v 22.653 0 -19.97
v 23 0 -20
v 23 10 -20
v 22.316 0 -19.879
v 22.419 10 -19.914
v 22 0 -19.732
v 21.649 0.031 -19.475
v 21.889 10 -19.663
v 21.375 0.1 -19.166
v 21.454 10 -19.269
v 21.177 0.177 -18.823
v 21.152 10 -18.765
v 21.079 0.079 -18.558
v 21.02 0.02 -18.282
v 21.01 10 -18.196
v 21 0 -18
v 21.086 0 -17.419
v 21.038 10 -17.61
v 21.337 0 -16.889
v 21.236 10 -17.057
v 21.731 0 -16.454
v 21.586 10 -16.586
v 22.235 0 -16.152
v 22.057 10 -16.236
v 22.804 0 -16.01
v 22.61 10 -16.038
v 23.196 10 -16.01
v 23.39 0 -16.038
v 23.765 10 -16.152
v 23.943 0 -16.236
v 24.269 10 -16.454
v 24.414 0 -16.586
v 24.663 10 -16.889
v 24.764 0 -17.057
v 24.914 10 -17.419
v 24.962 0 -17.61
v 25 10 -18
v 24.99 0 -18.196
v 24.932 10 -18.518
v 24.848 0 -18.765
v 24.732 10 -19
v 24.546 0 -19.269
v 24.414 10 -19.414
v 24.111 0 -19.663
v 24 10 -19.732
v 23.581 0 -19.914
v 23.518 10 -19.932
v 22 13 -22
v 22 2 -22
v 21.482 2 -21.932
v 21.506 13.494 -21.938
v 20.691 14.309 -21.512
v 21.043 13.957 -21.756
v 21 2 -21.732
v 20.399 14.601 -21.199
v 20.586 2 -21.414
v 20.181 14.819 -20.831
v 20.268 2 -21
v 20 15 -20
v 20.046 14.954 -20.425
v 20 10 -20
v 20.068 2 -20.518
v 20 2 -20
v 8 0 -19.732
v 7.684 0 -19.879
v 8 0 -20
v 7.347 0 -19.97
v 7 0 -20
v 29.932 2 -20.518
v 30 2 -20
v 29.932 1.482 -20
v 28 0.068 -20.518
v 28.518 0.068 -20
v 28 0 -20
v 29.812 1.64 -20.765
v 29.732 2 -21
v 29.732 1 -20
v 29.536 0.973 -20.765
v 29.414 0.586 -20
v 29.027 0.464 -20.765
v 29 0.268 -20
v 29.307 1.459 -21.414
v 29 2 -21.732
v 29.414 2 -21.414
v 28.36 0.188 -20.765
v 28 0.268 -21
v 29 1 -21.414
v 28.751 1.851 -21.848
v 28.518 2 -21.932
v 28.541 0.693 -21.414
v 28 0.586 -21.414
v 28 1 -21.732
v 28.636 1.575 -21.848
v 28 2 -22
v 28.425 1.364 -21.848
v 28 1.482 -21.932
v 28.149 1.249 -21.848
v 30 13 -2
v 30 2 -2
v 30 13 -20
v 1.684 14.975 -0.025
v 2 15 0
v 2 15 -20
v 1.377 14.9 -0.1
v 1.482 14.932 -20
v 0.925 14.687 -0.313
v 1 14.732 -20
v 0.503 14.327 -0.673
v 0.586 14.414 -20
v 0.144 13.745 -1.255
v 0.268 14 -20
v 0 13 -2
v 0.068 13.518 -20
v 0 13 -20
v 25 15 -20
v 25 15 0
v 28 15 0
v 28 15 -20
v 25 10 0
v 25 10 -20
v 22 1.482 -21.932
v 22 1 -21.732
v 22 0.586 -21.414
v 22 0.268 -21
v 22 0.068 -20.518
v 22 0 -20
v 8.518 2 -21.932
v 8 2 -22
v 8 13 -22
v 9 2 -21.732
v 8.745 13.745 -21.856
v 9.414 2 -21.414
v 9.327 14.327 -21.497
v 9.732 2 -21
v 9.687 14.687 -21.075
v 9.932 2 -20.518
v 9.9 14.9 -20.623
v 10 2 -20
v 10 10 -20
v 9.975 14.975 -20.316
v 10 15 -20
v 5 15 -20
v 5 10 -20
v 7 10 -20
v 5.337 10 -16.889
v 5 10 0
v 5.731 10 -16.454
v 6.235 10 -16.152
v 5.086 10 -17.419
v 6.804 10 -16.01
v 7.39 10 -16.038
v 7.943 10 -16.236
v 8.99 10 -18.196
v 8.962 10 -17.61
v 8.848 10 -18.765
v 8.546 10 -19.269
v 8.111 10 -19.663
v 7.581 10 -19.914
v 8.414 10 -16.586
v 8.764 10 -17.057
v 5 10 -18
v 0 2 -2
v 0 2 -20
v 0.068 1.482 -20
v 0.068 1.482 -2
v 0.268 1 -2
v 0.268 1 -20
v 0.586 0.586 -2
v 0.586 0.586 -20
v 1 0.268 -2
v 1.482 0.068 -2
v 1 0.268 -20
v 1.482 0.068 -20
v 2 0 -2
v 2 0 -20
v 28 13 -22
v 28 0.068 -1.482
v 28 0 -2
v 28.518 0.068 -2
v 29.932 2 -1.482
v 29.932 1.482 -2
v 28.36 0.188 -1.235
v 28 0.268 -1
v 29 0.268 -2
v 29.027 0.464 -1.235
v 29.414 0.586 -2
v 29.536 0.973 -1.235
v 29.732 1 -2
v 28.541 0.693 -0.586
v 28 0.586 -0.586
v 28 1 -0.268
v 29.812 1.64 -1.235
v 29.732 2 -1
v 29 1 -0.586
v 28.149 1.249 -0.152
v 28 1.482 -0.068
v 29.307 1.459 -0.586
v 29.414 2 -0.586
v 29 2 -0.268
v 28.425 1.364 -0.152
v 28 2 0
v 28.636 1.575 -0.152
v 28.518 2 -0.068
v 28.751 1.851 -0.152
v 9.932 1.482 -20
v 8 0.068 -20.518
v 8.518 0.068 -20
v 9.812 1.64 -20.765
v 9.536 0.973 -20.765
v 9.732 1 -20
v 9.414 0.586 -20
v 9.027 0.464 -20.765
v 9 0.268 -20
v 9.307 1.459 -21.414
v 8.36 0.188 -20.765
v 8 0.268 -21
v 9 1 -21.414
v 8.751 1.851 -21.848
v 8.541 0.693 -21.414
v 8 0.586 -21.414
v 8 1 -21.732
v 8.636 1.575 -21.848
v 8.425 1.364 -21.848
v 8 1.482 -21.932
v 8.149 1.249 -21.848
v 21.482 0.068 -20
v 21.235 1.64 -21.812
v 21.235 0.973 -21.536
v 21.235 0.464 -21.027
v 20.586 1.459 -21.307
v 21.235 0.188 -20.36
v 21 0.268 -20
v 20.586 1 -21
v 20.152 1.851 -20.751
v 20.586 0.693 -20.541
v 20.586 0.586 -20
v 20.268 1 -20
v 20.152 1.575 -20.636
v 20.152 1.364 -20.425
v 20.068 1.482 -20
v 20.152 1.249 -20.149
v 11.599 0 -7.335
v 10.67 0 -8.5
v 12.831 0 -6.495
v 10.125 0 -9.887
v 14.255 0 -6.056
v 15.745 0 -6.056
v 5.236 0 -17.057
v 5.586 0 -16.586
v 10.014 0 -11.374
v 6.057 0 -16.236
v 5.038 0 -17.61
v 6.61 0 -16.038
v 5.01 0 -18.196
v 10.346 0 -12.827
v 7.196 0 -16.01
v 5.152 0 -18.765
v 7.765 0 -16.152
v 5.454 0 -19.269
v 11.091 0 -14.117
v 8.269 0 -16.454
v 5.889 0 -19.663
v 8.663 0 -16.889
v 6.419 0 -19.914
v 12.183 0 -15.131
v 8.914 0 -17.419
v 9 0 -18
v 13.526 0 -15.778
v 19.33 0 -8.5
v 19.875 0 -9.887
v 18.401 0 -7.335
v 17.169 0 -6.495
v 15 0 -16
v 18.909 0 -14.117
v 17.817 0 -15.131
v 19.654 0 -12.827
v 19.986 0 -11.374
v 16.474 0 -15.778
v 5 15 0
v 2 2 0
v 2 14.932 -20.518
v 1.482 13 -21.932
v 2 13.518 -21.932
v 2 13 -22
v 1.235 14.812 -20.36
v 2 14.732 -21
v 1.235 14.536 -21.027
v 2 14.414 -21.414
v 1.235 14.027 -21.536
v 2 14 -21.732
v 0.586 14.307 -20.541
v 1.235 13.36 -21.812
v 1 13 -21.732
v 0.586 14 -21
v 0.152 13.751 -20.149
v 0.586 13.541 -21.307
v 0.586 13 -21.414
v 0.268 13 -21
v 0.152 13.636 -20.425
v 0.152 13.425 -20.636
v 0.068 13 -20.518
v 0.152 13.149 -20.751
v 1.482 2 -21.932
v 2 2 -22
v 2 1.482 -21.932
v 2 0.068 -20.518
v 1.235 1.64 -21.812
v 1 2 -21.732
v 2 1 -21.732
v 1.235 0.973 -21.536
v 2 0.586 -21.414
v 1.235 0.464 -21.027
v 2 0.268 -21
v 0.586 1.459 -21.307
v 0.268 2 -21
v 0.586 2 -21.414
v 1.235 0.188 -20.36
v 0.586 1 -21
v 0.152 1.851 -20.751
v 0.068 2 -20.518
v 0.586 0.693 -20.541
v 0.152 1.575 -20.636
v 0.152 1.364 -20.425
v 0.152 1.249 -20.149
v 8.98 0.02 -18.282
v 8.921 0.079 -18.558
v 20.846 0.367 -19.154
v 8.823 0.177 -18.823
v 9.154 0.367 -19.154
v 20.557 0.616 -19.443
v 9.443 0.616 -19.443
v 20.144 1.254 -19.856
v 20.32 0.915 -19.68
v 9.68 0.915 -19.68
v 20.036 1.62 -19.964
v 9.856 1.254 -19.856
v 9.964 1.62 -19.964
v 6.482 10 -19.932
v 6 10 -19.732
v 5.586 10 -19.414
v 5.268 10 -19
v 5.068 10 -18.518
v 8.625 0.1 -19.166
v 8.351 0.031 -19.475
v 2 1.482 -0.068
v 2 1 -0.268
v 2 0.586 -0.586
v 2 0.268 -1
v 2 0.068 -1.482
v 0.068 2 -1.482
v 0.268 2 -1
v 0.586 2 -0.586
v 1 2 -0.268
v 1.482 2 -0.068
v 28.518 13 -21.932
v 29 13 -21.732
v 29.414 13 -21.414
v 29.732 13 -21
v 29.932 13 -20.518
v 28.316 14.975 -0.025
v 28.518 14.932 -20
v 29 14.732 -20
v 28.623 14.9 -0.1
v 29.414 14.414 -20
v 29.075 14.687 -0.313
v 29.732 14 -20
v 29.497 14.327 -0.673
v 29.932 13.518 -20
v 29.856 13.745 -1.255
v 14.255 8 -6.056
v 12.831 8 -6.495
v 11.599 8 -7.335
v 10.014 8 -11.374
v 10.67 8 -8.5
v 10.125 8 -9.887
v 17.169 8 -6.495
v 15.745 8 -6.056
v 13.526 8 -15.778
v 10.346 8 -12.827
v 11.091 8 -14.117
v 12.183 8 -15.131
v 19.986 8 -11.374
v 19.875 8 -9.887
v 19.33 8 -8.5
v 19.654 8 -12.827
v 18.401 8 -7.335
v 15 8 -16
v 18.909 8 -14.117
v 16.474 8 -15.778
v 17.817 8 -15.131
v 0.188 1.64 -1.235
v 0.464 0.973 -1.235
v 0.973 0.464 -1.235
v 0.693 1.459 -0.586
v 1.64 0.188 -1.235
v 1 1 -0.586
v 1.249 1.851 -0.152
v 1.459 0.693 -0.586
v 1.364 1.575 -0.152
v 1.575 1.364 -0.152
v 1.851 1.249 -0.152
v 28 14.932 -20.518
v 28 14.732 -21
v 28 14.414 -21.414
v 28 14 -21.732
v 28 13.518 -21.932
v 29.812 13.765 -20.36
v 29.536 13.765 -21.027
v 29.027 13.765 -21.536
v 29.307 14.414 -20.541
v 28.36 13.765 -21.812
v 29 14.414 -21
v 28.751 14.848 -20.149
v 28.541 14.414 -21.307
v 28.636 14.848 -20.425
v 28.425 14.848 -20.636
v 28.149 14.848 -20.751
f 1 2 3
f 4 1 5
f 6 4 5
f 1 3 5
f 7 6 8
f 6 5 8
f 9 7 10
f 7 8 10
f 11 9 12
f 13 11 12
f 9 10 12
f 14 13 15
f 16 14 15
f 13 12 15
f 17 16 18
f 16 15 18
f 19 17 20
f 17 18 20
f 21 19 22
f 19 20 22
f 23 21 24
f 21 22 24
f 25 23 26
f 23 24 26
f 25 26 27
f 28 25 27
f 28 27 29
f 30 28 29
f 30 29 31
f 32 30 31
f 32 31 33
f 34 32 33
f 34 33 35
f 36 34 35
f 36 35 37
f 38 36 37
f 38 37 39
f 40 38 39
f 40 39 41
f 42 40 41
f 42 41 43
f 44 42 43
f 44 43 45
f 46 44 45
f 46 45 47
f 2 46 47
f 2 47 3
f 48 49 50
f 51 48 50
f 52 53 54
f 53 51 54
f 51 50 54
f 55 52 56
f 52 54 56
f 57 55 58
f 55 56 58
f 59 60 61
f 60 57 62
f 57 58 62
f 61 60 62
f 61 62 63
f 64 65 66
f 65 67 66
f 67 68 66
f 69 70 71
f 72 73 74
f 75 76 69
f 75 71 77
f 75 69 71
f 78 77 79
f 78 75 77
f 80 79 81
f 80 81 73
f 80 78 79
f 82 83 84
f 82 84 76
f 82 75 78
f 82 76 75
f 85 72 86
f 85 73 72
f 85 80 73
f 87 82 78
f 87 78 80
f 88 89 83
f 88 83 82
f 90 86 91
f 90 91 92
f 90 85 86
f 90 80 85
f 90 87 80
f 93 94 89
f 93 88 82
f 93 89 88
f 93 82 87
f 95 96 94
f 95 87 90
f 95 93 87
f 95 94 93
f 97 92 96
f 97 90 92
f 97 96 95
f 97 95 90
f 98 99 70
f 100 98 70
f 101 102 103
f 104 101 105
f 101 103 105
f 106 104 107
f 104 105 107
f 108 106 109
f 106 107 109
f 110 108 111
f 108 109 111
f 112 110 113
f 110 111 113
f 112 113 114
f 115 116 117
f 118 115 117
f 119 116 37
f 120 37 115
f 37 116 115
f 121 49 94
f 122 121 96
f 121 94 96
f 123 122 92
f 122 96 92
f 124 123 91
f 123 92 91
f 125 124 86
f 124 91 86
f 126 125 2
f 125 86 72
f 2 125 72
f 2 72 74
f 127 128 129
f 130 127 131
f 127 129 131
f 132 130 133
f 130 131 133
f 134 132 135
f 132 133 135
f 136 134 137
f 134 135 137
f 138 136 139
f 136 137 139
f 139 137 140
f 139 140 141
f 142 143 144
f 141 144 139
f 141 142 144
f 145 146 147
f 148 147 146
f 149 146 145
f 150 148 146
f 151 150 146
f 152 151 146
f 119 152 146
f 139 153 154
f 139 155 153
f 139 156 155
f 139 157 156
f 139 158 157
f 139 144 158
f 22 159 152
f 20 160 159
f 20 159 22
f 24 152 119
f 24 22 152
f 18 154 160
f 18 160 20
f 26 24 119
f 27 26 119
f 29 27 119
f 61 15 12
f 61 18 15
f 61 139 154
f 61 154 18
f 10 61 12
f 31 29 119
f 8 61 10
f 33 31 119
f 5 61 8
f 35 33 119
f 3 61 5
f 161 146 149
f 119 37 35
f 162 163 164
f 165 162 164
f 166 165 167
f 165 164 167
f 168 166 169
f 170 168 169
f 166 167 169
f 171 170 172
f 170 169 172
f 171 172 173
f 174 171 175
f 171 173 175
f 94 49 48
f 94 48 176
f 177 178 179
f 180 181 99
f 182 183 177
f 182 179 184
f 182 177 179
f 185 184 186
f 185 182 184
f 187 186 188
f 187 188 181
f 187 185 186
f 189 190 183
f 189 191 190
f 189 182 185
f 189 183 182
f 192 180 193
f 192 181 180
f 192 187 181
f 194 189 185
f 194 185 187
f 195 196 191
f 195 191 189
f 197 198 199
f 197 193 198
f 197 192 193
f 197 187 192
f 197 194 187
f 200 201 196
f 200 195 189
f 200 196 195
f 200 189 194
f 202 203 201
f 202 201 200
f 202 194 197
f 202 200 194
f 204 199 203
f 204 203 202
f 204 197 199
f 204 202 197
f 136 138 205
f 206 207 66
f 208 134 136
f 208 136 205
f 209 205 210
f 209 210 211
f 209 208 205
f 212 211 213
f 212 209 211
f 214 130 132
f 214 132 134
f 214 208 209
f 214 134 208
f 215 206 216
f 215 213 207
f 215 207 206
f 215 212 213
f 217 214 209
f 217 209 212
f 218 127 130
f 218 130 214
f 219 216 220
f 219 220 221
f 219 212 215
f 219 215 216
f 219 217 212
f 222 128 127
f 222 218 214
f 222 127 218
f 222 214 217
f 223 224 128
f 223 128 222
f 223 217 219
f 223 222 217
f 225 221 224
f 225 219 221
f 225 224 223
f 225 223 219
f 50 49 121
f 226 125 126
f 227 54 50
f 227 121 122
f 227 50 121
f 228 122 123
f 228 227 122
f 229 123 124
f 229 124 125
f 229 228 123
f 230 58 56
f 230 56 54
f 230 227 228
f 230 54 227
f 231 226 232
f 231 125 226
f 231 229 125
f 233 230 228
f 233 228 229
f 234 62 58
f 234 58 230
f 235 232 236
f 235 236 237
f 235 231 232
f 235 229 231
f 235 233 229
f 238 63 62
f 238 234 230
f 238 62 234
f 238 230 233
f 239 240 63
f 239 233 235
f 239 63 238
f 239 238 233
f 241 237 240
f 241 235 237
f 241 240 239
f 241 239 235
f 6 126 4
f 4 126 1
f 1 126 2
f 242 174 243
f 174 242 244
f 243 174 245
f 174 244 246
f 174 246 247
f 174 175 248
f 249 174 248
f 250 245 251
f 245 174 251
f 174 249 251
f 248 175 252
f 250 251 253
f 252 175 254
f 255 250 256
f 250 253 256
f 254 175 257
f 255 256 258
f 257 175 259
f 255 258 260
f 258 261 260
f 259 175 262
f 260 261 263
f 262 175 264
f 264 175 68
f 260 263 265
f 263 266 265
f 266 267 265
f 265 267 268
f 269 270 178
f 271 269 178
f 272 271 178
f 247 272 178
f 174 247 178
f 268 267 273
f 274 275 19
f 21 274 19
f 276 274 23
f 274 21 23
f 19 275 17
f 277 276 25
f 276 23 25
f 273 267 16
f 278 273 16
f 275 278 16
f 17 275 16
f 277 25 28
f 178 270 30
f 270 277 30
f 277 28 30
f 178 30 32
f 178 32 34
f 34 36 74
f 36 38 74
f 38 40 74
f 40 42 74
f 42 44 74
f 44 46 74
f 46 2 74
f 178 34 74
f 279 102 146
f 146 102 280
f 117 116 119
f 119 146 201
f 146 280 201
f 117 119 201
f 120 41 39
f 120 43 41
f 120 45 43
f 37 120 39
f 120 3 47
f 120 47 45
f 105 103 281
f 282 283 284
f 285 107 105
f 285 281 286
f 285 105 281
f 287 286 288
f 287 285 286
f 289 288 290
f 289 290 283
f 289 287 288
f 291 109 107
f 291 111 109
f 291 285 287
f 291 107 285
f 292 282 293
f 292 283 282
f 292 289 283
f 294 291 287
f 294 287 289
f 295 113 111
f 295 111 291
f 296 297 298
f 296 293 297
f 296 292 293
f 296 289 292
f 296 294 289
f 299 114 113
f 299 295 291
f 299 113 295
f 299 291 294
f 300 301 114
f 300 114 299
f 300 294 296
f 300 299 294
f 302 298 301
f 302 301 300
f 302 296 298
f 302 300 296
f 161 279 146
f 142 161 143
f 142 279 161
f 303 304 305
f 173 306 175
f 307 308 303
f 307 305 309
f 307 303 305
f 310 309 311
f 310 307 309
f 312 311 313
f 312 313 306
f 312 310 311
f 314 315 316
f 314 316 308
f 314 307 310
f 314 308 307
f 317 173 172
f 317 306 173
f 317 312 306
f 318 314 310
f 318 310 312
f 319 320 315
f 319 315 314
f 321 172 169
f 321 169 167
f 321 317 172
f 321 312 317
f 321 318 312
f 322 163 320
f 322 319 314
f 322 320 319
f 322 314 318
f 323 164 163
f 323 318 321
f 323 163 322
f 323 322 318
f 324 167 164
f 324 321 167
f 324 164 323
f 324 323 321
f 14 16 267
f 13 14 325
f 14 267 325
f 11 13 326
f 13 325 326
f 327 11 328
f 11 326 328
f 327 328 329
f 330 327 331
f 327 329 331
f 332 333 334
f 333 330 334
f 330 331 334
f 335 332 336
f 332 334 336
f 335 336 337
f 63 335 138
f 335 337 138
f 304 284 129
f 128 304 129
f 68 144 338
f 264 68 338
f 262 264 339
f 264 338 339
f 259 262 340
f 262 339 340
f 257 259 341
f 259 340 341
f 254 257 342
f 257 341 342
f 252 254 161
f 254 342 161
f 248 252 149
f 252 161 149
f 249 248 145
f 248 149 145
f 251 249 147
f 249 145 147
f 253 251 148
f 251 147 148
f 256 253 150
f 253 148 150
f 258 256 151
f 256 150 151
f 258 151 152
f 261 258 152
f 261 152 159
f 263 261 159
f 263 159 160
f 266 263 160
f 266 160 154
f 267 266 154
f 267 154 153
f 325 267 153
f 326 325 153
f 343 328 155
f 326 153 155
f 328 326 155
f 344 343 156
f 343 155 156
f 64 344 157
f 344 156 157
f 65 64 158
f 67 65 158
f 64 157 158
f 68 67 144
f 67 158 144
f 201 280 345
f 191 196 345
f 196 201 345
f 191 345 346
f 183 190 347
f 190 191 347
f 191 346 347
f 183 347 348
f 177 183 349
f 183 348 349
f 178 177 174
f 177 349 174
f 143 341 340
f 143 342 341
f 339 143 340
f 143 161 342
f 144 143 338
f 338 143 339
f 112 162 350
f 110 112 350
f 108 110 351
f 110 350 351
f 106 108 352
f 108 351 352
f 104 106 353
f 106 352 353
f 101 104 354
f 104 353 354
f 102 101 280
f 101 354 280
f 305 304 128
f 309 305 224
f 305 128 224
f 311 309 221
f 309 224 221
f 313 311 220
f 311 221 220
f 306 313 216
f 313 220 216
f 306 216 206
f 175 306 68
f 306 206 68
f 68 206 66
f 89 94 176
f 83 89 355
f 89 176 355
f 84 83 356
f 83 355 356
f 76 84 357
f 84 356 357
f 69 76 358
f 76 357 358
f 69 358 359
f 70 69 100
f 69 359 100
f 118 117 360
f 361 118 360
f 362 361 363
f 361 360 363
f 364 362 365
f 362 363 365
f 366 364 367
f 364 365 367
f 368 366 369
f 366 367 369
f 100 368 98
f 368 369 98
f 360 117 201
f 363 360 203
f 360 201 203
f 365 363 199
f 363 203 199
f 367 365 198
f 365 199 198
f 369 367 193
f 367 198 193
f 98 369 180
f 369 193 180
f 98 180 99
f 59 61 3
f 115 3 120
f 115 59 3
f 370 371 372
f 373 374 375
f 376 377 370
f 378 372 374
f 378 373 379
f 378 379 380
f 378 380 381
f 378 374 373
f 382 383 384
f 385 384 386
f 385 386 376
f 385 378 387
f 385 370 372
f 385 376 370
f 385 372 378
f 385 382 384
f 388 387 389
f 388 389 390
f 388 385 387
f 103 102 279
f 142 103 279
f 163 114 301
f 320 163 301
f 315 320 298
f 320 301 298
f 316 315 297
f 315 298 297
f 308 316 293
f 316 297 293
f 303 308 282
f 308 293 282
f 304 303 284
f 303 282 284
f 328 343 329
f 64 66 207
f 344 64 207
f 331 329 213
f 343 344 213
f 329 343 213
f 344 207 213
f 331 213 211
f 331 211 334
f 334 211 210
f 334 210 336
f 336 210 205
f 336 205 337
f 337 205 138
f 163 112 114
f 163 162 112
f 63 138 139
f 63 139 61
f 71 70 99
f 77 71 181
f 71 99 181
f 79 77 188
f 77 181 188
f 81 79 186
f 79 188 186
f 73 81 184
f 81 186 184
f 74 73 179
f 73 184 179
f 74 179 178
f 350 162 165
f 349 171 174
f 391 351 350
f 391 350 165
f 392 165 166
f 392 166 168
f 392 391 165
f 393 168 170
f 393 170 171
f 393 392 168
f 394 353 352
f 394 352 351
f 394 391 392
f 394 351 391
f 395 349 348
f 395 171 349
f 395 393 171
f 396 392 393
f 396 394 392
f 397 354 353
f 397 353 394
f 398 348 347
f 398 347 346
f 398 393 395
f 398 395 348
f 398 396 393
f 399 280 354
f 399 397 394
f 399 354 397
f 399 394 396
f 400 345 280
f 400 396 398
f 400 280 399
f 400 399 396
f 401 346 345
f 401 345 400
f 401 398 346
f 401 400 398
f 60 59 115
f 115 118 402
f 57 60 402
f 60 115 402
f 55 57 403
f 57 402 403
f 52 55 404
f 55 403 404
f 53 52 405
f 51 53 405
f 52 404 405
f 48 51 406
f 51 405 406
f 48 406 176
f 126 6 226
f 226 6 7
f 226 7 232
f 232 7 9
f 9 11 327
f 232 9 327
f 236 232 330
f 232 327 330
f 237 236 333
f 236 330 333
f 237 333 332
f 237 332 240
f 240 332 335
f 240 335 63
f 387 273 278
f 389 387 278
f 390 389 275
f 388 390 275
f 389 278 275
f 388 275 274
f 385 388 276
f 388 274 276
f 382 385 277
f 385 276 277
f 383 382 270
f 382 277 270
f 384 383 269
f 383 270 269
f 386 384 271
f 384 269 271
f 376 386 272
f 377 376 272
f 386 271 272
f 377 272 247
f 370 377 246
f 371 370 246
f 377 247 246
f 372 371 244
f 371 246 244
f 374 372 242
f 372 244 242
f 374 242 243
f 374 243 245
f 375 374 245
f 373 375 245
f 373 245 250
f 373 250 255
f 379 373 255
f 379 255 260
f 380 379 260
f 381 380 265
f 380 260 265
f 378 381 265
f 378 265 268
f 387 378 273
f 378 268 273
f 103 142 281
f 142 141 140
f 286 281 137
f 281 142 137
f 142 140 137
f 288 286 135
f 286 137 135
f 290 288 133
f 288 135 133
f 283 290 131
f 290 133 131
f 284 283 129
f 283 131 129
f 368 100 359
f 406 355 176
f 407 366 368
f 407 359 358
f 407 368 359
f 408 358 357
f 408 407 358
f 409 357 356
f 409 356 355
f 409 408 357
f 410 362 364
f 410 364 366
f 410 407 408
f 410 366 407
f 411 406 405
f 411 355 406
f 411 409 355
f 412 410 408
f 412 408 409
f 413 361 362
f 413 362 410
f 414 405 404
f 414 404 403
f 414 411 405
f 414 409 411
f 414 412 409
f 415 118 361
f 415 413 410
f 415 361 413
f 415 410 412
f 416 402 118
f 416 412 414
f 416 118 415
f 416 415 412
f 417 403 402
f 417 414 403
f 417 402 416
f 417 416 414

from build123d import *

# Parameters (mm, degrees)
SKETCH1_W           = 30
SKETCH1_H           = 30
BOSS_EXTRUDE2_DEPTH = 15
SKETCH3_W           = 20
SKETCH3_H           = 20
CUT_EXTRUDE1_DEPTH  = 5
SKETCH4_R           = 5
CUT_EXTRUDE2_DEPTH  = 8
SKETCH7_R           = 2
CUT_EXTRUDE4_DEPTH  = 25
SKETCH8_W           = 10
SKETCH8_H           = 10
CUT_EXTRUDE7_DEPTH  = 25
SKETCH9_W           = 30
SKETCH9_H           = 8
CUT_EXTRUDE8_DEPTH  = 25
FILLET1_R           = 2
FILLET2_R           = 2


with BuildPart() as part:
    # Sketch1 → Boss-Extrude2 (new body)
    with BuildSketch(Plane(origin=(0, 0, 0), x_dir=(1, 0, 0), z_dir=(0, 1, 0))):
        with Locations((15, 15)):
            Rectangle(SKETCH1_W, SKETCH1_H)
    extrude(amount=BOSS_EXTRUDE2_DEPTH)

    # Sketch3 → Cut-Extrude1 (cut)
    with BuildSketch(Plane(origin=(0, 15, 0), x_dir=(1, 0, 0), z_dir=(0, 1, 0))):
        with Locations((15, 10)):
            Rectangle(SKETCH3_W, SKETCH3_H)
    extrude(amount=-CUT_EXTRUDE1_DEPTH, mode=Mode.SUBTRACT)

    # Sketch4 → Cut-Extrude2 (cut)
    with BuildSketch(Plane.XZ):
        with Locations(Location((15, -11, 0), (0, 0, 270))):
            Circle(SKETCH4_R)
    extrude(amount=-CUT_EXTRUDE2_DEPTH, mode=Mode.SUBTRACT)

    # Sketch7 → Cut-Extrude4 (cut)
    with BuildSketch(Plane(origin=(0, 10, 0), x_dir=(1, 0, 0), z_dir=(0, 1, 0))):
        with Locations(Location((7, 18, 0), (0, 0, 90))):
            Circle(SKETCH7_R)
        with Locations(Location((23, 18, 0), (0, 0, 90))):
            Circle(SKETCH7_R)
    extrude(amount=-CUT_EXTRUDE4_DEPTH, mode=Mode.SUBTRACT)

    # Sketch8 → Cut-Extrude7 (cut)
    with BuildSketch(Plane(origin=(0, 15, 0), x_dir=(1, 0, 0), z_dir=(0, 1, 0))):
        with Locations((15, 25)):
            Rectangle(SKETCH8_W, SKETCH8_H)
    extrude(amount=-CUT_EXTRUDE7_DEPTH, mode=Mode.SUBTRACT)

    # Sketch9 → Cut-Extrude8 (cut)
    with BuildSketch(Plane(origin=(0, 15, 0), x_dir=(1, 0, 0), z_dir=(0, 1, 0))):
        with Locations((15, 26)):
            Rectangle(SKETCH9_W, SKETCH9_H)
    extrude(amount=-CUT_EXTRUDE8_DEPTH, mode=Mode.SUBTRACT)

    # Fillet1
    # the kernel refuses this fillet: 2 mm, written as the material it takes off along each edge
    with BuildSketch(Plane(origin=(20, 0, -20), x_dir=(1, 0, 0), z_dir=(0, 0, -1)), Plane(origin=(10, 0, -27), x_dir=(-1, 0, 0), z_dir=(0, 0, 1))) as fillet1_piece_1:
        with BuildLine():
            CenterArc((FILLET1_R, -FILLET1_R), FILLET1_R, 90, 90)
            Line((0, -FILLET1_R), (0, 0))
            Line((0, 0), (FILLET1_R, 0))
        make_face()
    extrude(amount=7, mode=Mode.SUBTRACT)
    with BuildSketch(Plane(origin=(10, 0, -20), x_dir=(0, 0, 1), z_dir=(1, 0, 0))) as fillet1_piece_2:
        with BuildLine():
            CenterArc((FILLET1_R, -FILLET1_R), FILLET1_R, 90, 90)
            Line((0, -FILLET1_R), (0, 0))
            Line((0, 0), (FILLET1_R, 0))
        make_face()
    extrude(amount=10, mode=Mode.SUBTRACT)
    with BuildSketch(Plane(origin=(15, 0, -22), x_dir=(0, 0, 1), z_dir=(-1, 0, 0)), Plane(origin=(35, 0, -22), x_dir=(0, 0, 1), z_dir=(-1, 0, 0))) as fillet1_piece_3:
        with BuildLine():
            CenterArc((FILLET1_R, FILLET1_R), FILLET1_R, 180, 90)
            Line((0, FILLET1_R), (0, 0))
            Line((0, 0), (FILLET1_R, 0))
        make_face()
    extrude(amount=20, mode=Mode.SUBTRACT)
    with BuildSketch(Plane(origin=(0, 0, -27), x_dir=(1, 0, 0), z_dir=(0, 0, 1)), Plane(origin=(30, 0, 5), x_dir=(-1, 0, 0), z_dir=(0, 0, -1))) as fillet1_piece_4:
        with BuildLine():
            CenterArc((FILLET1_R, FILLET1_R), FILLET1_R, 180, 90)
            Line((0, FILLET1_R), (0, 0))
            Line((0, 0), (FILLET1_R, 0))
        make_face()
    extrude(amount=32, mode=Mode.SUBTRACT)
    with BuildSketch(Plane(origin=(-5, 0, 0), x_dir=(0, 1, 0), z_dir=(1, 0, 0))) as fillet1_piece_5:
        with BuildLine():
            CenterArc((FILLET1_R, -FILLET1_R), FILLET1_R, 90, 90)
            Line((0, -FILLET1_R), (0, 0))
            Line((0, 0), (FILLET1_R, 0))
        make_face()
    extrude(amount=40, mode=Mode.SUBTRACT)
    with BuildSketch(Plane(origin=(10, 0, -20), x_dir=(0, 0, 1), z_dir=(1, 0, 0))) as fillet1_piece_6a_section:
        with BuildLine():
            CenterArc((FILLET1_R, -FILLET1_R), FILLET1_R, 90, 90)
            Line((0, -FILLET1_R), (0, 0))
            Line((0, 0), (FILLET1_R, 0))
        make_face()
    fillet1_piece_6a = extrude(amount=15, mode=Mode.PRIVATE)
    fillet1_piece_6a = split(fillet1_piece_6a, bisect_by=Plane(origin=(20, 0.452790229, -19.547209771), z_dir=(1, 0, 0)), keep=Keep.TOP, mode=Mode.PRIVATE)
    with BuildSketch(Plane(origin=(20, 0, -15), x_dir=(1, 0, 0), z_dir=(0, 0, -1))) as fillet1_piece_6b_section:
        with BuildLine():
            CenterArc((FILLET1_R, -FILLET1_R), FILLET1_R, 90, 90)
            Line((0, -FILLET1_R), (0, 0))
            Line((0, 0), (FILLET1_R, 0))
        make_face()
    fillet1_piece_6b = extrude(amount=12, mode=Mode.PRIVATE)
    fillet1_piece_6b = split(fillet1_piece_6b, bisect_by=Plane(origin=(20.452790229, 0.452790229, -20), z_dir=(0, 0, 1)), keep=Keep.TOP, mode=Mode.PRIVATE)
    fillet1_piece_6 = fillet1_piece_6a & fillet1_piece_6b
    add(fillet1_piece_6, mode=Mode.SUBTRACT)
    with BuildSketch(Plane(origin=(10, 0, -27), x_dir=(-1, 0, 0), z_dir=(0, 0, 1))) as fillet1_piece_7a_section:
        with BuildLine():
            CenterArc((FILLET1_R, -FILLET1_R), FILLET1_R, 90, 90)
            Line((0, -FILLET1_R), (0, 0))
            Line((0, 0), (FILLET1_R, 0))
        make_face()
    fillet1_piece_7a = extrude(amount=12, mode=Mode.PRIVATE)
    fillet1_piece_7a = split(fillet1_piece_7a, bisect_by=Plane(origin=(9.547209771, 0.452790229, -20), z_dir=(0, 0, 1)), keep=Keep.TOP, mode=Mode.PRIVATE)
    with BuildSketch(Plane(origin=(5, 0, -20), x_dir=(0, 0, 1), z_dir=(1, 0, 0))) as fillet1_piece_7b_section:
        with BuildLine():
            CenterArc((FILLET1_R, -FILLET1_R), FILLET1_R, 90, 90)
            Line((0, -FILLET1_R), (0, 0))
            Line((0, 0), (FILLET1_R, 0))
        make_face()
    fillet1_piece_7b = extrude(amount=15, mode=Mode.PRIVATE)
    fillet1_piece_7b = split(fillet1_piece_7b, bisect_by=Plane(origin=(10, 0.452790229, -19.547209771), z_dir=(-1, 0, 0)), keep=Keep.TOP, mode=Mode.PRIVATE)
    fillet1_piece_7 = fillet1_piece_7a & fillet1_piece_7b
    add(fillet1_piece_7, mode=Mode.SUBTRACT)

    # Fillet2
    # the kernel refuses this fillet: 2 mm, written as the material it takes off along each edge
    with BuildSketch(Plane(origin=(2, 2, -2), x_dir=(-1, 0, 0), z_dir=(0, 0, 1))) as fillet2_piece_1_section:
        Polygon((0, 0), (FILLET2_R, 0), (FILLET2_R, FILLET2_R), (0, FILLET2_R), align=None)
    fillet2_piece_1 = extrude(amount=FILLET2_R, mode=Mode.PRIVATE)
    fillet2_piece_1 = fillet2_piece_1 - Plane(origin=(2, 2, -2), x_dir=(0.7071067811865475, 0.7071067811865475, 0), z_dir=(0, 0, 1)) * Sphere(FILLET2_R, mode=Mode.PRIVATE)
    add(fillet2_piece_1, mode=Mode.SUBTRACT)
    with BuildSketch(Plane(origin=(2, 2, -20), x_dir=(0, 0, -1), z_dir=(-1, 0, 0))) as fillet2_piece_2_section:
        Polygon((0, 0), (FILLET2_R, 0), (FILLET2_R, FILLET2_R), (0, FILLET2_R), align=None)
    fillet2_piece_2 = extrude(amount=FILLET2_R, mode=Mode.PRIVATE)
    fillet2_piece_2 = fillet2_piece_2 - Plane(origin=(2, 2, -20), x_dir=(0, 0.7071067811865475, 0.7071067811865475), z_dir=(-1, 0, 0)) * Sphere(FILLET2_R, mode=Mode.PRIVATE)
    add(fillet2_piece_2, mode=Mode.SUBTRACT)
    with BuildSketch(Plane(origin=(8, 2, -20), x_dir=(1, 0, 0), z_dir=(0, 0, -1))) as fillet2_piece_3_section:
        Polygon((0, 0), (FILLET2_R, 0), (FILLET2_R, FILLET2_R), (0, FILLET2_R), align=None)
    fillet2_piece_3 = extrude(amount=FILLET2_R, mode=Mode.PRIVATE)
    fillet2_piece_3 = fillet2_piece_3 - Plane(origin=(8, 2, -20), x_dir=(-0.7071067811865475, 0.7071067811865475, 0), z_dir=(0, 0, -1)) * Sphere(FILLET2_R, mode=Mode.PRIVATE)
    add(fillet2_piece_3, mode=Mode.SUBTRACT)
    with BuildSketch(Plane(origin=(28, 2, -2), x_dir=(1, 0, 0), z_dir=(0, 0, 1))) as fillet2_piece_4_section:
        Polygon((0, 0), (FILLET2_R, 0), (FILLET2_R, -FILLET2_R), (0, -FILLET2_R), align=None)
    fillet2_piece_4 = extrude(amount=FILLET2_R, mode=Mode.PRIVATE)
    fillet2_piece_4 = fillet2_piece_4 - Plane(origin=(28, 2, -2), x_dir=(-0.7071067811865475, 0.7071067811865475, 0), z_dir=(0, 0, 1)) * Sphere(FILLET2_R, mode=Mode.PRIVATE)
    add(fillet2_piece_4, mode=Mode.SUBTRACT)
    with BuildSketch(Plane(origin=(22, 2, -20), x_dir=(0, 0, -1), z_dir=(-1, 0, 0))) as fillet2_piece_5_section:
        Polygon((0, 0), (FILLET2_R, 0), (FILLET2_R, FILLET2_R), (0, FILLET2_R), align=None)
    fillet2_piece_5 = extrude(amount=FILLET2_R, mode=Mode.PRIVATE)
    fillet2_piece_5 = fillet2_piece_5 - Plane(origin=(22, 2, -20), x_dir=(0, 0.7071067811865475, 0.7071067811865475), z_dir=(-1, 0, 0)) * Sphere(FILLET2_R, mode=Mode.PRIVATE)
    add(fillet2_piece_5, mode=Mode.SUBTRACT)
    with BuildSketch(Plane(origin=(28, 2, -20), x_dir=(1, 0, 0), z_dir=(0, 0, -1))) as fillet2_piece_6_section:
        Polygon((0, 0), (FILLET2_R, 0), (FILLET2_R, FILLET2_R), (0, FILLET2_R), align=None)
    fillet2_piece_6 = extrude(amount=FILLET2_R, mode=Mode.PRIVATE)
    fillet2_piece_6 = fillet2_piece_6 - Plane(origin=(28, 2, -20), x_dir=(-0.7071067811865475, 0.7071067811865475, 0), z_dir=(0, 0, -1)) * Sphere(FILLET2_R, mode=Mode.PRIVATE)
    add(fillet2_piece_6, mode=Mode.SUBTRACT)
    with BuildSketch(Plane(origin=(2, 13, -20), x_dir=(0, 0, -1), z_dir=(-1, 0, 0))) as fillet2_piece_7_section:
        Polygon((0, 0), (FILLET2_R, 0), (FILLET2_R, -FILLET2_R), (0, -FILLET2_R), align=None)
    fillet2_piece_7 = extrude(amount=FILLET2_R, mode=Mode.PRIVATE)
    fillet2_piece_7 = fillet2_piece_7 - Plane(origin=(2, 13, -20), x_dir=(0, -0.7071067811865475, 0.7071067811865475), z_dir=(-1, 0, 0)) * Sphere(FILLET2_R, mode=Mode.PRIVATE)
    add(fillet2_piece_7, mode=Mode.SUBTRACT)
    with BuildSketch(Plane(origin=(28, 13, -20), x_dir=(1, 0, 0), z_dir=(0, 1, 0))) as fillet2_piece_8_section:
        Polygon((0, 0), (FILLET2_R, 0), (FILLET2_R, FILLET2_R), (0, FILLET2_R), align=None)
    fillet2_piece_8 = extrude(amount=FILLET2_R, mode=Mode.PRIVATE)
    fillet2_piece_8 = fillet2_piece_8 - Plane(origin=(28, 13, -20), x_dir=(-0.7071067811865475, 0, 0.7071067811865475), z_dir=(0, 1, 0)) * Sphere(FILLET2_R, mode=Mode.PRIVATE)
    add(fillet2_piece_8, mode=Mode.SUBTRACT)
    with BuildSketch(Plane(origin=(0, 15, -20), x_dir=(0, -1, 0), z_dir=(0, 0, 1))) as fillet2_piece_9:
        with BuildLine():
            CenterArc((FILLET2_R, FILLET2_R), FILLET2_R, 180, 90)
            Line((0, FILLET2_R), (0, 0))
            Line((0, 0), (FILLET2_R, 0))
        make_face()
    extrude(amount=25, mode=Mode.SUBTRACT)
    with BuildSketch(Plane(origin=(0, 2, 0), x_dir=(1, 0, 0), z_dir=(0, 1, 0)), Plane(origin=(20, 2, -22), x_dir=(0, 0, 1), z_dir=(0, 1, 0))) as fillet2_piece_10:
        with BuildLine():
            CenterArc((FILLET2_R, FILLET2_R), FILLET2_R, 180, 90)
            Line((0, FILLET2_R), (0, 0))
            Line((0, 0), (FILLET2_R, 0))
        make_face()
    extrude(amount=18, mode=Mode.SUBTRACT)
    with BuildSketch(Plane(origin=(15, 15, -22), x_dir=(0, -1, 0), z_dir=(-1, 0, 0)), Plane(origin=(28, 15, -22), x_dir=(0, -1, 0), z_dir=(-1, 0, 0))) as fillet2_piece_11:
        with BuildLine():
            CenterArc((FILLET2_R, FILLET2_R), FILLET2_R, 180, 90)
            Line((0, FILLET2_R), (0, 0))
            Line((0, 0), (FILLET2_R, 0))
        make_face()
    extrude(amount=13, mode=Mode.SUBTRACT)
    with BuildSketch(Plane(origin=(0, 13, -22), x_dir=(0, 0, 1), z_dir=(0, -1, 0)), Plane(origin=(30, 13, -22), x_dir=(-1, 0, 0), z_dir=(0, -1, 0))) as fillet2_piece_12:
        with BuildLine():
            CenterArc((FILLET2_R, -FILLET2_R), FILLET2_R, 90, 90)
            Line((0, -FILLET2_R), (0, 0))
            Line((0, 0), (FILLET2_R, 0))
        make_face()
    extrude(amount=11, mode=Mode.SUBTRACT)
    with BuildSketch(Plane(origin=(10, 20, -22), x_dir=(-1, 0, 0), z_dir=(0, -1, 0)), Plane(origin=(30, 2, 0), x_dir=(-1, 0, 0), z_dir=(0, 1, 0))) as fillet2_piece_13:
        with BuildLine():
            CenterArc((FILLET2_R, -FILLET2_R), FILLET2_R, 90, 90)
            Line((0, -FILLET2_R), (0, 0))
            Line((0, 0), (FILLET2_R, 0))
        make_face()
    extrude(amount=18, mode=Mode.SUBTRACT)
    with BuildSketch(Plane(origin=(30, 15, 5), x_dir=(-1, 0, 0), z_dir=(0, 0, -1))) as fillet2_piece_14:
        with BuildLine():
            CenterArc((FILLET2_R, -FILLET2_R), FILLET2_R, 90, 90)
            Line((0, -FILLET2_R), (0, 0))
            Line((0, 0), (FILLET2_R, 0))
        make_face()
    extrude(amount=25, mode=Mode.SUBTRACT)


solid = part.part
